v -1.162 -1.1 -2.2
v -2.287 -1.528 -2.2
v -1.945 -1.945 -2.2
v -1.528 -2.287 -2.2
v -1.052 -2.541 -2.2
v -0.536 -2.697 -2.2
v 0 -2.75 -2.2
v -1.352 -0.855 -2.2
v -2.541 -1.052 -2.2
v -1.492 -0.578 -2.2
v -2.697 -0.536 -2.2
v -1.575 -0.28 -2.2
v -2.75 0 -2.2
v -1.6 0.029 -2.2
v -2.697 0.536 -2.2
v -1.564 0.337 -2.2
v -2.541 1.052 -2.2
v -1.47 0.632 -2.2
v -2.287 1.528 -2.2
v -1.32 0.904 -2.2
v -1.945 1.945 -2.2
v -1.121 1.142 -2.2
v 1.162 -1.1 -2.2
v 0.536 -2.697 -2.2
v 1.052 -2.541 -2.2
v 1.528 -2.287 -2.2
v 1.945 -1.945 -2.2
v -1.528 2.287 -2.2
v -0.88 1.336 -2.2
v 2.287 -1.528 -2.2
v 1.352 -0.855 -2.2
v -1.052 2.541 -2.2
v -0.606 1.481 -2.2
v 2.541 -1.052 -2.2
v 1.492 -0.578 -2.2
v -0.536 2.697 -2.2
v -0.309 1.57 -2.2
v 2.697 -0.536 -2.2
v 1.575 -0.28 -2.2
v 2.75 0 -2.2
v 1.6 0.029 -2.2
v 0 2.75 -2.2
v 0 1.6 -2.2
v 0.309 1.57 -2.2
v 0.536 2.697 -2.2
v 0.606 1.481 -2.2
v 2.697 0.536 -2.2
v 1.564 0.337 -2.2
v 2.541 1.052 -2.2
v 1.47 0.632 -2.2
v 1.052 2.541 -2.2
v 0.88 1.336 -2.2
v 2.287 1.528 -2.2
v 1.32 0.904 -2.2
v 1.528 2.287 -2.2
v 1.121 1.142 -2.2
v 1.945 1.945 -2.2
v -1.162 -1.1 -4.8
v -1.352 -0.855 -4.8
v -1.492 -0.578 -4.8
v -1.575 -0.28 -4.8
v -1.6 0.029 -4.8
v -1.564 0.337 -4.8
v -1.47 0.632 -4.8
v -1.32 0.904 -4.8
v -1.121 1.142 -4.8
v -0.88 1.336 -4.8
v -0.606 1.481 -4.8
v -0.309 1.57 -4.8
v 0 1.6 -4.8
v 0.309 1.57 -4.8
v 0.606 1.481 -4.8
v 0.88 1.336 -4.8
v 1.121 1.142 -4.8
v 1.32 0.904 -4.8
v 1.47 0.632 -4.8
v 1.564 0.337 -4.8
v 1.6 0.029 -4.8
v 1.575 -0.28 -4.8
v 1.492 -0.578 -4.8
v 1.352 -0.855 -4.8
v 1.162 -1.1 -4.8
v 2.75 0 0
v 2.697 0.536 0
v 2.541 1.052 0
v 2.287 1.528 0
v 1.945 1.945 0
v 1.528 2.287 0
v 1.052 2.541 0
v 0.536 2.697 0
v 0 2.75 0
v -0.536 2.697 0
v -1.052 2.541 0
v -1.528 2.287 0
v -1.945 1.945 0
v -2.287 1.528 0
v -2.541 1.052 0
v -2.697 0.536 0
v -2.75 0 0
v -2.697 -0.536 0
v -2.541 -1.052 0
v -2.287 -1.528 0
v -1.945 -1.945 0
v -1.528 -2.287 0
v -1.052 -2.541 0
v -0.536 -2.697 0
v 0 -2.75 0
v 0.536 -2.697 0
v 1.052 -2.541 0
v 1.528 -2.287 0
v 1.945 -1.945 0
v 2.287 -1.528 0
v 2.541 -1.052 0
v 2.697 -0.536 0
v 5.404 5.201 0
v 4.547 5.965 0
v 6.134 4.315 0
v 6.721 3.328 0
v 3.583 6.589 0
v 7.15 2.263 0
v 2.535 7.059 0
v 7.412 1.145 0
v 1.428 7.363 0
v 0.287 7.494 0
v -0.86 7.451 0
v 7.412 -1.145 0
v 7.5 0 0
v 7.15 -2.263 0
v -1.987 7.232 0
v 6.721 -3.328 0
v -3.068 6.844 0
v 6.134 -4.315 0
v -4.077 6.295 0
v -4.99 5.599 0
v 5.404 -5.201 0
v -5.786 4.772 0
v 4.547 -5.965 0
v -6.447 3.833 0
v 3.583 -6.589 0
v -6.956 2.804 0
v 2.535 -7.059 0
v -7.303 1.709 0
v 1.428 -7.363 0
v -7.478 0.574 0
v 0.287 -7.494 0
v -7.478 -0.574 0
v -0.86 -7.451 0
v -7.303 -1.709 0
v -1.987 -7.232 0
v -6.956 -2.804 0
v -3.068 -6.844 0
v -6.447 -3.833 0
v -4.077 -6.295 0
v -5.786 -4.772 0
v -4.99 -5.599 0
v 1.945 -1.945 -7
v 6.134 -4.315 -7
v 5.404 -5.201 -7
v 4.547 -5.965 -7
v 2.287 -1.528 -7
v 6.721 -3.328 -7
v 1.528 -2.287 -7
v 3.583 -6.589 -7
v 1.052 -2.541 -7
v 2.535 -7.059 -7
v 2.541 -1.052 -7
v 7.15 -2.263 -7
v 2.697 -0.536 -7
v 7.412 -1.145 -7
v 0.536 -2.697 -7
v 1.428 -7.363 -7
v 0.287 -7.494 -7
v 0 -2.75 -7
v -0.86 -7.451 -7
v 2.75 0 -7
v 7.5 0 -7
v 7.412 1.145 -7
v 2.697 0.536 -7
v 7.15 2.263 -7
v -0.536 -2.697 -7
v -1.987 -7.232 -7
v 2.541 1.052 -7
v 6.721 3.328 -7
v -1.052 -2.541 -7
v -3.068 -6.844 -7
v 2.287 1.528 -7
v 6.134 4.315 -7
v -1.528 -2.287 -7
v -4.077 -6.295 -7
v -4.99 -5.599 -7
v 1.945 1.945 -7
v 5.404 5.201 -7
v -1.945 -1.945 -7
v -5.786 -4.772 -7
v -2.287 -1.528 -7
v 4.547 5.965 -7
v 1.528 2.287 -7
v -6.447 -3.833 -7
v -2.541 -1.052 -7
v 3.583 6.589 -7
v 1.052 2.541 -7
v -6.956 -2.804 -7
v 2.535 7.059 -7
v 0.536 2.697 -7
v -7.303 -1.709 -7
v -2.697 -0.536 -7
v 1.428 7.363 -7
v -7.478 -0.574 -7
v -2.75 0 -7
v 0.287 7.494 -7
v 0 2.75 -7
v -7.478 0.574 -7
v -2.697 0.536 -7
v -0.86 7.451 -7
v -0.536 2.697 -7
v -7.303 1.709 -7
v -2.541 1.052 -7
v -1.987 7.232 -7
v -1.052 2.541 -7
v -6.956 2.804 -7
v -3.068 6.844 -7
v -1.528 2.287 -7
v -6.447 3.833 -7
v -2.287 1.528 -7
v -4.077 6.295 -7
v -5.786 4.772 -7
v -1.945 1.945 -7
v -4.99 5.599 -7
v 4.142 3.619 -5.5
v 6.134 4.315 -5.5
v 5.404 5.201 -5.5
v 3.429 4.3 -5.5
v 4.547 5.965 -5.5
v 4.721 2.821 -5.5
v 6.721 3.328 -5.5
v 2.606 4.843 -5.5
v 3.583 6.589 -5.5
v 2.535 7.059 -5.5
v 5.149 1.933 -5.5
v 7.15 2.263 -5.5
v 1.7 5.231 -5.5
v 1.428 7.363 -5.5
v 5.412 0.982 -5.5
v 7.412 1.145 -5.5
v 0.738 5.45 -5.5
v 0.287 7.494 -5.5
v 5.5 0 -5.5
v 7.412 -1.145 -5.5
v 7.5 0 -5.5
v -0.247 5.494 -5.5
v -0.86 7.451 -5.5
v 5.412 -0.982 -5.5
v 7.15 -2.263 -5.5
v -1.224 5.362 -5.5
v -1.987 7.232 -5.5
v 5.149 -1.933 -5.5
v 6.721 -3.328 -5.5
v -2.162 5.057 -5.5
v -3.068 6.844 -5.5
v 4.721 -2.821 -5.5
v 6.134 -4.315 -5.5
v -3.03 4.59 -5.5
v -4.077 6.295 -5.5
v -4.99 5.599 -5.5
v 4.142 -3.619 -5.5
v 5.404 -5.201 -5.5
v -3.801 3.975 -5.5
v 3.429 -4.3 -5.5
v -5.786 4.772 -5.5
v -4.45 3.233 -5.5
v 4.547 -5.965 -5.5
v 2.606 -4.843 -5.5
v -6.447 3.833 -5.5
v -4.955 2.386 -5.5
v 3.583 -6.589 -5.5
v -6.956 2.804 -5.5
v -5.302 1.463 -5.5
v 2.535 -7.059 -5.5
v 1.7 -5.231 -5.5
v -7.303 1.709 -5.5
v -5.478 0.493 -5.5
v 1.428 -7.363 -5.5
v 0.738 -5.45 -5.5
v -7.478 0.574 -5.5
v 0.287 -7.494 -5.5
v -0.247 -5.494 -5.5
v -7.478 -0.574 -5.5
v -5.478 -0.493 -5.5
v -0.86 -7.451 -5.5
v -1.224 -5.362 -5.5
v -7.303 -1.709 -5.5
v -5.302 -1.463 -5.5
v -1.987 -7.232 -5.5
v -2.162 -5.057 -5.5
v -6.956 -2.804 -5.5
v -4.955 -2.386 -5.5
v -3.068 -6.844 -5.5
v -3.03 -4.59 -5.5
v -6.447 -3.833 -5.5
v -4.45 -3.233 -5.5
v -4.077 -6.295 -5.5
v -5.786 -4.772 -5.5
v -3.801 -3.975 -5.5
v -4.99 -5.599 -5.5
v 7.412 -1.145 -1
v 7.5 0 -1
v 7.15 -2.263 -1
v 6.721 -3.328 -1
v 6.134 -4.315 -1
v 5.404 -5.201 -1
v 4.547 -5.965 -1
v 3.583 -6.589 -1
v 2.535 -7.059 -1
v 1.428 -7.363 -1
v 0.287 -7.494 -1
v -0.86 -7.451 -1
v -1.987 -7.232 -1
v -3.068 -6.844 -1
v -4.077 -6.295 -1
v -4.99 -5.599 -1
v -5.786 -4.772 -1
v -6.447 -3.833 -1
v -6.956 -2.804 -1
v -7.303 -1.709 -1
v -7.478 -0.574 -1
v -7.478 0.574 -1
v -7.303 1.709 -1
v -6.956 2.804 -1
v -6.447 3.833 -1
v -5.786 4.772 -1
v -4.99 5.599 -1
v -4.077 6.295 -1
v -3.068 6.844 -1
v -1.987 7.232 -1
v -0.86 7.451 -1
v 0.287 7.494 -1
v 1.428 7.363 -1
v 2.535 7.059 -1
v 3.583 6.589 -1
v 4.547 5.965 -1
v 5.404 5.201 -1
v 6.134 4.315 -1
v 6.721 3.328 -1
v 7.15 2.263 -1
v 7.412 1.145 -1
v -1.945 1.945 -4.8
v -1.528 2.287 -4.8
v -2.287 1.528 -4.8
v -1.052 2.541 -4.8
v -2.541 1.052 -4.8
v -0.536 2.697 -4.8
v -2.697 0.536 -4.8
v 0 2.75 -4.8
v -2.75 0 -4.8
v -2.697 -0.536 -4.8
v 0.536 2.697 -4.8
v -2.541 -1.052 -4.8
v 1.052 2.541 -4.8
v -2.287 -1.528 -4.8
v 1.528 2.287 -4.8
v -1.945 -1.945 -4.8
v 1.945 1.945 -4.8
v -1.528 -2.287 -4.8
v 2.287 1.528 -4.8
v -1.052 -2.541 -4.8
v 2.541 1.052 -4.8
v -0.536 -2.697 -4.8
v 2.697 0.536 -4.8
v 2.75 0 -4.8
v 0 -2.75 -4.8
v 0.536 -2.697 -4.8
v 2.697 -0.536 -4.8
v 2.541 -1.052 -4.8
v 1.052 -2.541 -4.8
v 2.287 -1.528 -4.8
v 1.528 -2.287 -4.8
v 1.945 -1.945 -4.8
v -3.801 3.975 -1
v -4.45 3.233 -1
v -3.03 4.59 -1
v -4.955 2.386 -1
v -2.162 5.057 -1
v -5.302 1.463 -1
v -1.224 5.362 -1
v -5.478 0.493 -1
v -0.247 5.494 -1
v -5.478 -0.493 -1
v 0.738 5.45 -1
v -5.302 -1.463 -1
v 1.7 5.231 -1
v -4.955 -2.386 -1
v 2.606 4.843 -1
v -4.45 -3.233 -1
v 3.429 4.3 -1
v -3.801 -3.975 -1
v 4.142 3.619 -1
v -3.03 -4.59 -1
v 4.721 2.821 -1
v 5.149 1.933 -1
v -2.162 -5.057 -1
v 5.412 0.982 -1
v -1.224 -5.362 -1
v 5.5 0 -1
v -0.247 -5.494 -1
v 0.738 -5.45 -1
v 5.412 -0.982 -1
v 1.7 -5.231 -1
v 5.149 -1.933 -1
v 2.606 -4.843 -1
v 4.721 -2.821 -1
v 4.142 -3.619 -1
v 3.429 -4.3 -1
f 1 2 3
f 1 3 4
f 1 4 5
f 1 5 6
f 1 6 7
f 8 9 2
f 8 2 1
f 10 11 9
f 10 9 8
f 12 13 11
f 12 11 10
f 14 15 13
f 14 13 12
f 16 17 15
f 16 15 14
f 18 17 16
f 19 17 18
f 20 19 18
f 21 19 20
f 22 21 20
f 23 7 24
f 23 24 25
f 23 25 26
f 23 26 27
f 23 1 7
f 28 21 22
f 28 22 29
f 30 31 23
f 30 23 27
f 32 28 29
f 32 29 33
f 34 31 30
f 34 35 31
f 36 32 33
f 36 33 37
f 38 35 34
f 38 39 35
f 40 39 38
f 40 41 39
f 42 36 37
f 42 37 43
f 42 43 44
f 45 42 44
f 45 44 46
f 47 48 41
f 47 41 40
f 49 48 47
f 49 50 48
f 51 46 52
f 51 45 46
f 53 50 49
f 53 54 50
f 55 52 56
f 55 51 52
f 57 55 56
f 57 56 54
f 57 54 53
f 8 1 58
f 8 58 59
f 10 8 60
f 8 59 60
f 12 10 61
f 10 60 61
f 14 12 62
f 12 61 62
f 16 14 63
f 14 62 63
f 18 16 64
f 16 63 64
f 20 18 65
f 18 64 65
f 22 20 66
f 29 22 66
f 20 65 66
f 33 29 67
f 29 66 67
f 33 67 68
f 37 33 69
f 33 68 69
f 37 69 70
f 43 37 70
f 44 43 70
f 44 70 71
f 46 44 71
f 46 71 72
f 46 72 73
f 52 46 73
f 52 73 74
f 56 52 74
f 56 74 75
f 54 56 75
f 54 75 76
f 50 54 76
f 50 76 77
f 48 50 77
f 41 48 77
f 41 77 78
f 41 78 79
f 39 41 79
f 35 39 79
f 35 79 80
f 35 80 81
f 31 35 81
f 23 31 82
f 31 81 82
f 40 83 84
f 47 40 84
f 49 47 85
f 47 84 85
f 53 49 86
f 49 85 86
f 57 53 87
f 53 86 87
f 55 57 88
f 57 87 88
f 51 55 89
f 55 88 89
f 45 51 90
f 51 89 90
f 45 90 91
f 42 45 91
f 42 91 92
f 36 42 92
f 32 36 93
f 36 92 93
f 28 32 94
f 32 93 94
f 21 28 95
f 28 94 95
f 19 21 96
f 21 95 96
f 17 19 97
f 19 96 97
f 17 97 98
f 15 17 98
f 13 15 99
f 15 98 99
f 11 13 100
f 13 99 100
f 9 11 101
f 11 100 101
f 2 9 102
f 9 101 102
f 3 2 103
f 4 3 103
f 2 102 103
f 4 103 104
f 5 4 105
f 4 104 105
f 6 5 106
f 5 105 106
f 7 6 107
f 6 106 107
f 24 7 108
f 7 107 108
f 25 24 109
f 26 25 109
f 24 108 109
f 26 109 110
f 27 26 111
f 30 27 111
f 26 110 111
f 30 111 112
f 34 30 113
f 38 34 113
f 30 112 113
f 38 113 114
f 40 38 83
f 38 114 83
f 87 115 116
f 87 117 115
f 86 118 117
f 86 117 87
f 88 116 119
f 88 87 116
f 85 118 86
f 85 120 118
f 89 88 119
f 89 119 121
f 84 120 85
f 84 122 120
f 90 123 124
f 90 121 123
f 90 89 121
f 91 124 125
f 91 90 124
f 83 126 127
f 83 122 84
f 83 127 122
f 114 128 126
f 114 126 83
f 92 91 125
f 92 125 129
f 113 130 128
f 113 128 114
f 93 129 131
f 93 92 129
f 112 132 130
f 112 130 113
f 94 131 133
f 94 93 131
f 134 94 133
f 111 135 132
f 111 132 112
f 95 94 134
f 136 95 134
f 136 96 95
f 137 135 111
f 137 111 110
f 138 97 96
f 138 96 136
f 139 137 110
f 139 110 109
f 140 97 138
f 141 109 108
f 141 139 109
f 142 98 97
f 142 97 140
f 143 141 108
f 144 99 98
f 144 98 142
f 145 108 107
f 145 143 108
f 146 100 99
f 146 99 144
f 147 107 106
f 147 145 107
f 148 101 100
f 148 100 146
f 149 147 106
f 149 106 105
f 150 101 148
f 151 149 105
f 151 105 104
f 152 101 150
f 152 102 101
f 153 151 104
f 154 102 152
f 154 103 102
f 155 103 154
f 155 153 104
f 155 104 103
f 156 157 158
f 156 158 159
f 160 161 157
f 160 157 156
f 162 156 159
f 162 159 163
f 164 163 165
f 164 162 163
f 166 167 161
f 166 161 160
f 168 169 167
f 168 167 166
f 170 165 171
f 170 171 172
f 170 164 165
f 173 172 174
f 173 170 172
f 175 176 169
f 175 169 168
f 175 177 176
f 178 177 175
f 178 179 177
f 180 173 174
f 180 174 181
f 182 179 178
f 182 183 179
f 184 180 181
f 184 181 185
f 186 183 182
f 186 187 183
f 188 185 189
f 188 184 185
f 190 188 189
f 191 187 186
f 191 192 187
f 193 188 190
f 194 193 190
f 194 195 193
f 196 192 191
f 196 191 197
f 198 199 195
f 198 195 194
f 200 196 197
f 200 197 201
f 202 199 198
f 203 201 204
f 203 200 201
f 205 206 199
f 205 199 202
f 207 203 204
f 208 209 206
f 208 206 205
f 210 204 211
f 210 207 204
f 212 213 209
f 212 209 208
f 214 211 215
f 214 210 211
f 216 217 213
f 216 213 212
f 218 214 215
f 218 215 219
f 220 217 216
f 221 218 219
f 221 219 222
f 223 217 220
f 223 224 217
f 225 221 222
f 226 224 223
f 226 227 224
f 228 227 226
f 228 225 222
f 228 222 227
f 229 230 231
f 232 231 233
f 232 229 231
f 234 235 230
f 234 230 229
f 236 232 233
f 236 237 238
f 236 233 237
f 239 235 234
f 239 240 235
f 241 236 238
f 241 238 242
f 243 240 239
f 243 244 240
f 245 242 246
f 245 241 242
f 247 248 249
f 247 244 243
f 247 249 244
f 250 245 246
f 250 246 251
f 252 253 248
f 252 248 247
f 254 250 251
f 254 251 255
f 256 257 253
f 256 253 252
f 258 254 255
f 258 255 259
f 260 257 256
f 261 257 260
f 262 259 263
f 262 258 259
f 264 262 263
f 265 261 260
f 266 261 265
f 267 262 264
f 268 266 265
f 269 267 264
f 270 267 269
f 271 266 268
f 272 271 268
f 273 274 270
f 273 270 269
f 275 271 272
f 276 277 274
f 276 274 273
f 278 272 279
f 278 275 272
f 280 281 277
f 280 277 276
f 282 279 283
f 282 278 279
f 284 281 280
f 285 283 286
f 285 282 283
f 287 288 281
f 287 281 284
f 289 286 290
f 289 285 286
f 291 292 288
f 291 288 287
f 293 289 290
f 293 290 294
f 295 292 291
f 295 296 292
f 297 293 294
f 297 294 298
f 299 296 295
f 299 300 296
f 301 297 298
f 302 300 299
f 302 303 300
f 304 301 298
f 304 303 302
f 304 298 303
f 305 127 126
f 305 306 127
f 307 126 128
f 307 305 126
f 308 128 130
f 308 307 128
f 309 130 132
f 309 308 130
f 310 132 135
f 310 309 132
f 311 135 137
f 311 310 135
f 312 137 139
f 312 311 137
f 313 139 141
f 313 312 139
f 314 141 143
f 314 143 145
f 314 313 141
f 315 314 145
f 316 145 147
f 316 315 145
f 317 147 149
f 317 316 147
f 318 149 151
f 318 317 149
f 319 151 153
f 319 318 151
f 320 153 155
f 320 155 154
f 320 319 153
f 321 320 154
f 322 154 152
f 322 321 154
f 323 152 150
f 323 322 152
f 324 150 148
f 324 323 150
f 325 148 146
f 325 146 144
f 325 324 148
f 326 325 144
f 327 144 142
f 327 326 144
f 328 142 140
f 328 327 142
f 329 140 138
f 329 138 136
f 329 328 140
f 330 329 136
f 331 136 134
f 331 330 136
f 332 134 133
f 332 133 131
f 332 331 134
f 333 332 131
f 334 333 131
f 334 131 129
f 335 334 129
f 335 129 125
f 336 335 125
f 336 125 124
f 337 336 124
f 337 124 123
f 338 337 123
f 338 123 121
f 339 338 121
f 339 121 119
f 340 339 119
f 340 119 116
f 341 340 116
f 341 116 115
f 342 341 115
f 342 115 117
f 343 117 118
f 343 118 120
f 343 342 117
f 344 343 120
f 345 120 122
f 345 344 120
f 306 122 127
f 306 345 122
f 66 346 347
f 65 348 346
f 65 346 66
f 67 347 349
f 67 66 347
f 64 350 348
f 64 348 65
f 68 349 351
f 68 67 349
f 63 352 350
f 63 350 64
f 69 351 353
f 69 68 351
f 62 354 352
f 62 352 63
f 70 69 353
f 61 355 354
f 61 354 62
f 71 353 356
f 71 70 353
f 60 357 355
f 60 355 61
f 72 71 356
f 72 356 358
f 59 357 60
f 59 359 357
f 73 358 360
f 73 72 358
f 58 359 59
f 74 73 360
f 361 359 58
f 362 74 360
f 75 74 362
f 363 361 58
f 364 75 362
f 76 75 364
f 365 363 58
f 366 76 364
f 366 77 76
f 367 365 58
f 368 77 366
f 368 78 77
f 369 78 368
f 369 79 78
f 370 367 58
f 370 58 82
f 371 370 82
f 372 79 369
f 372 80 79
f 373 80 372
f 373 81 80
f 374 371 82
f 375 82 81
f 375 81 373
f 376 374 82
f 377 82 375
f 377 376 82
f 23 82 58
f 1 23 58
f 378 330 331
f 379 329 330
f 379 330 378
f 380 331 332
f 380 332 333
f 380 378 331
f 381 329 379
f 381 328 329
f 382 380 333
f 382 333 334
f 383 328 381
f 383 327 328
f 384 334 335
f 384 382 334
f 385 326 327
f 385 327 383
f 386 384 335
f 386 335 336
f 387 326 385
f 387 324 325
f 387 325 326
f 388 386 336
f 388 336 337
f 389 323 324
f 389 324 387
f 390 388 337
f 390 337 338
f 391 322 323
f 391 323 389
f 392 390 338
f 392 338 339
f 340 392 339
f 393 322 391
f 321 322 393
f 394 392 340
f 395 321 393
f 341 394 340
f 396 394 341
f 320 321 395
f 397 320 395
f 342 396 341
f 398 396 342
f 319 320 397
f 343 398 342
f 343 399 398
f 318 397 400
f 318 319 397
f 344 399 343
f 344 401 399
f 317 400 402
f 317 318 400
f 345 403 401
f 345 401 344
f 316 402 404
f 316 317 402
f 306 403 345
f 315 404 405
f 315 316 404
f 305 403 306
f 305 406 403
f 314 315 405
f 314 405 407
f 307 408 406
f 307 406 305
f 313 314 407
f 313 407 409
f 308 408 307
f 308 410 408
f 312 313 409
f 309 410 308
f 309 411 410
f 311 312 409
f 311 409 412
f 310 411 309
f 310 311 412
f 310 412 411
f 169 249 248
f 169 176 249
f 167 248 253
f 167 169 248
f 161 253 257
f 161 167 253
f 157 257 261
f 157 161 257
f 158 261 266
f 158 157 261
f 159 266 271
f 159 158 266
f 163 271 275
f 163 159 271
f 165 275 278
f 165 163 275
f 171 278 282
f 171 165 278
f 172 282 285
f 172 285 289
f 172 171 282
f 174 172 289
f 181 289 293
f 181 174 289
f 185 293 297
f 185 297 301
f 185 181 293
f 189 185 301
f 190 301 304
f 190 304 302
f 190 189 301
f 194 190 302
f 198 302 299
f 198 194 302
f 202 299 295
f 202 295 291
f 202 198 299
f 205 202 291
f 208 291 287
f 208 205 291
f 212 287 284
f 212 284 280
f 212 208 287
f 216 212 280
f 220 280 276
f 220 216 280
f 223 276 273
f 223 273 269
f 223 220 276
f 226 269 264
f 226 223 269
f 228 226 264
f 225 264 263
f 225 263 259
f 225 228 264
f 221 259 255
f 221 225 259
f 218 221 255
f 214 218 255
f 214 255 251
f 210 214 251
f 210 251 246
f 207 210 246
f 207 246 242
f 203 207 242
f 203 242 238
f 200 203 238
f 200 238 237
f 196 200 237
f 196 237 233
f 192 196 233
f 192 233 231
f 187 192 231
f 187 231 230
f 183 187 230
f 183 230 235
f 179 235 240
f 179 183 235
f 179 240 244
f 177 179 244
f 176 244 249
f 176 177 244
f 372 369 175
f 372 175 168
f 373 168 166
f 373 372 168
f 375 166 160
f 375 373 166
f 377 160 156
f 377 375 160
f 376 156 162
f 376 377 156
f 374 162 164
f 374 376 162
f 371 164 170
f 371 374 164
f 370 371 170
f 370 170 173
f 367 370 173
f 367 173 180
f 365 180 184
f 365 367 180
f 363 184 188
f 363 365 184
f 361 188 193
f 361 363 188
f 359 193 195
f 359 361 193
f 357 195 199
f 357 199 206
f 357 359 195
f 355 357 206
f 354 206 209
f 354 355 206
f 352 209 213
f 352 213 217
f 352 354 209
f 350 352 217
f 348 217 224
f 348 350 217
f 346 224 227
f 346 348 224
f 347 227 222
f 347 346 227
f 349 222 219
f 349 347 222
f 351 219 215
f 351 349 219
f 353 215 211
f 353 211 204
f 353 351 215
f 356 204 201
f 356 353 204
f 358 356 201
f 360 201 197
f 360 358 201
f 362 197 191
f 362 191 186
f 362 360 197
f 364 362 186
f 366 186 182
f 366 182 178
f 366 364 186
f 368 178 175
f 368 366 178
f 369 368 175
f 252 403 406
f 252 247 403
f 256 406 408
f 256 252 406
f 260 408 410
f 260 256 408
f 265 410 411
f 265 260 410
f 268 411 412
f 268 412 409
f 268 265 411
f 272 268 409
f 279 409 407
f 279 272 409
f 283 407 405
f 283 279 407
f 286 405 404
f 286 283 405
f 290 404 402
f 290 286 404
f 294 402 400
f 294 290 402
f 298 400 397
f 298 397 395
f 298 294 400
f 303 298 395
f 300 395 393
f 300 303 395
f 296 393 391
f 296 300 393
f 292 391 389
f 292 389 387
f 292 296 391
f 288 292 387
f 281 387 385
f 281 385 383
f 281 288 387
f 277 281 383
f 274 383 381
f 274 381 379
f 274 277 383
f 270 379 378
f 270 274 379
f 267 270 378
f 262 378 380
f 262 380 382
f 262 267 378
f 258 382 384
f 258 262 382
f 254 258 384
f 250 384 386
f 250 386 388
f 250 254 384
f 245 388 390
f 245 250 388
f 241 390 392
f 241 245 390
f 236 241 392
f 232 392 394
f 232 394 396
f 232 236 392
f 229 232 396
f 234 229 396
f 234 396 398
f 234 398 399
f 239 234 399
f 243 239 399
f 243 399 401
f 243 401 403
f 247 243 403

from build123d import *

# Parameters (mm, degrees)
SKETCH2_R           = 3
CUT_EXTRUDE1_DEPTH  = 2
SKETCH3_R           = 2.25
SKETCH3_R_2         = 1.25
BOSS_EXTRUDE1_DEPTH = 5
SKETCH4_R           = 1.6
CUT_EXTRUDE2_DEPTH  = 10
BOSS_EXTRUDE2_DEPTH = 7
SKETCH6_R           = 2.75
CUT_EXTRUDE4_DEPTH  = 2.2
CUT_EXTRUDE5_START  = -2.2
SKETCH7_R           = 2.75
CUT_EXTRUDE5_DEPTH  = 2.2


with BuildPart() as part:
    # Sketch1 → Revolve1 (revolve)
    with BuildSketch(Plane(origin=(0, 0, 0), x_dir=(1, 0, 0), z_dir=(0, 1, 0))):
        Polygon((1.25, 0), (7.5, 0), (7.5, 1), (5.5, 1), (5.5, 5.5), (7.5, 5.5), (7.5, 7), (3, 7), (3, 9), (2.25, 9), (2.25, 2), (1.25, 2), align=None)
    revolve(axis=Axis((0, 0, 0), (0, 0, -1)))

    # Sketch2 → Cut-Extrude1 (cut)
    with BuildSketch(Plane(origin=(0, 0, -9), x_dir=(-1, 0, 0), z_dir=(0, 0, -1))):
        Circle(SKETCH2_R)
    extrude(amount=-CUT_EXTRUDE1_DEPTH, mode=Mode.SUBTRACT)

    # Sketch3 → Boss-Extrude1 (add)
    with BuildSketch(Plane(origin=(0, 0, -2), x_dir=(-1, 0, 0), z_dir=(0, 0, -1))):
        Circle(SKETCH3_R)
        Circle(SKETCH3_R_2, mode=Mode.SUBTRACT)
    extrude(amount=BOSS_EXTRUDE1_DEPTH)

    # Sketch4 → Cut-Extrude2 (cut)
    with BuildSketch(Plane(origin=(0, 0, -7), x_dir=(-1, 0, 0), z_dir=(0, 0, -1))):
        Circle(SKETCH4_R)
    extrude(amount=-CUT_EXTRUDE2_DEPTH, mode=Mode.SUBTRACT)

    # Sketch5 → Boss-Extrude2 (add)
    with BuildSketch(Plane(origin=(0, 0, -7), x_dir=(-1, 0, 0), z_dir=(0, 0, -1))):
        with BuildLine():
            Line((-1.161895004, -1.1), (1.161895004, -1.1))
            ThreePointArc((1.161895004, -1.1), (0, -1.6), (-1.161895004, -1.1))
        make_face()
    extrude(amount=-BOSS_EXTRUDE2_DEPTH)

    # Sketch6 → Cut-Extrude4 (cut)
    with BuildSketch(Plane.XY):
        Circle(SKETCH6_R)
    extrude(amount=-CUT_EXTRUDE4_DEPTH, mode=Mode.SUBTRACT)

    # Sketch7 → Cut-Extrude5 (cut)
    with BuildSketch(Plane(origin=(0, 0, -7), x_dir=(-1, 0, 0), z_dir=(0, 0, -1)).offset(CUT_EXTRUDE5_START)):
        Circle(SKETCH7_R)
    extrude(amount=CUT_EXTRUDE5_DEPTH, mode=Mode.SUBTRACT)


solid = part.part
